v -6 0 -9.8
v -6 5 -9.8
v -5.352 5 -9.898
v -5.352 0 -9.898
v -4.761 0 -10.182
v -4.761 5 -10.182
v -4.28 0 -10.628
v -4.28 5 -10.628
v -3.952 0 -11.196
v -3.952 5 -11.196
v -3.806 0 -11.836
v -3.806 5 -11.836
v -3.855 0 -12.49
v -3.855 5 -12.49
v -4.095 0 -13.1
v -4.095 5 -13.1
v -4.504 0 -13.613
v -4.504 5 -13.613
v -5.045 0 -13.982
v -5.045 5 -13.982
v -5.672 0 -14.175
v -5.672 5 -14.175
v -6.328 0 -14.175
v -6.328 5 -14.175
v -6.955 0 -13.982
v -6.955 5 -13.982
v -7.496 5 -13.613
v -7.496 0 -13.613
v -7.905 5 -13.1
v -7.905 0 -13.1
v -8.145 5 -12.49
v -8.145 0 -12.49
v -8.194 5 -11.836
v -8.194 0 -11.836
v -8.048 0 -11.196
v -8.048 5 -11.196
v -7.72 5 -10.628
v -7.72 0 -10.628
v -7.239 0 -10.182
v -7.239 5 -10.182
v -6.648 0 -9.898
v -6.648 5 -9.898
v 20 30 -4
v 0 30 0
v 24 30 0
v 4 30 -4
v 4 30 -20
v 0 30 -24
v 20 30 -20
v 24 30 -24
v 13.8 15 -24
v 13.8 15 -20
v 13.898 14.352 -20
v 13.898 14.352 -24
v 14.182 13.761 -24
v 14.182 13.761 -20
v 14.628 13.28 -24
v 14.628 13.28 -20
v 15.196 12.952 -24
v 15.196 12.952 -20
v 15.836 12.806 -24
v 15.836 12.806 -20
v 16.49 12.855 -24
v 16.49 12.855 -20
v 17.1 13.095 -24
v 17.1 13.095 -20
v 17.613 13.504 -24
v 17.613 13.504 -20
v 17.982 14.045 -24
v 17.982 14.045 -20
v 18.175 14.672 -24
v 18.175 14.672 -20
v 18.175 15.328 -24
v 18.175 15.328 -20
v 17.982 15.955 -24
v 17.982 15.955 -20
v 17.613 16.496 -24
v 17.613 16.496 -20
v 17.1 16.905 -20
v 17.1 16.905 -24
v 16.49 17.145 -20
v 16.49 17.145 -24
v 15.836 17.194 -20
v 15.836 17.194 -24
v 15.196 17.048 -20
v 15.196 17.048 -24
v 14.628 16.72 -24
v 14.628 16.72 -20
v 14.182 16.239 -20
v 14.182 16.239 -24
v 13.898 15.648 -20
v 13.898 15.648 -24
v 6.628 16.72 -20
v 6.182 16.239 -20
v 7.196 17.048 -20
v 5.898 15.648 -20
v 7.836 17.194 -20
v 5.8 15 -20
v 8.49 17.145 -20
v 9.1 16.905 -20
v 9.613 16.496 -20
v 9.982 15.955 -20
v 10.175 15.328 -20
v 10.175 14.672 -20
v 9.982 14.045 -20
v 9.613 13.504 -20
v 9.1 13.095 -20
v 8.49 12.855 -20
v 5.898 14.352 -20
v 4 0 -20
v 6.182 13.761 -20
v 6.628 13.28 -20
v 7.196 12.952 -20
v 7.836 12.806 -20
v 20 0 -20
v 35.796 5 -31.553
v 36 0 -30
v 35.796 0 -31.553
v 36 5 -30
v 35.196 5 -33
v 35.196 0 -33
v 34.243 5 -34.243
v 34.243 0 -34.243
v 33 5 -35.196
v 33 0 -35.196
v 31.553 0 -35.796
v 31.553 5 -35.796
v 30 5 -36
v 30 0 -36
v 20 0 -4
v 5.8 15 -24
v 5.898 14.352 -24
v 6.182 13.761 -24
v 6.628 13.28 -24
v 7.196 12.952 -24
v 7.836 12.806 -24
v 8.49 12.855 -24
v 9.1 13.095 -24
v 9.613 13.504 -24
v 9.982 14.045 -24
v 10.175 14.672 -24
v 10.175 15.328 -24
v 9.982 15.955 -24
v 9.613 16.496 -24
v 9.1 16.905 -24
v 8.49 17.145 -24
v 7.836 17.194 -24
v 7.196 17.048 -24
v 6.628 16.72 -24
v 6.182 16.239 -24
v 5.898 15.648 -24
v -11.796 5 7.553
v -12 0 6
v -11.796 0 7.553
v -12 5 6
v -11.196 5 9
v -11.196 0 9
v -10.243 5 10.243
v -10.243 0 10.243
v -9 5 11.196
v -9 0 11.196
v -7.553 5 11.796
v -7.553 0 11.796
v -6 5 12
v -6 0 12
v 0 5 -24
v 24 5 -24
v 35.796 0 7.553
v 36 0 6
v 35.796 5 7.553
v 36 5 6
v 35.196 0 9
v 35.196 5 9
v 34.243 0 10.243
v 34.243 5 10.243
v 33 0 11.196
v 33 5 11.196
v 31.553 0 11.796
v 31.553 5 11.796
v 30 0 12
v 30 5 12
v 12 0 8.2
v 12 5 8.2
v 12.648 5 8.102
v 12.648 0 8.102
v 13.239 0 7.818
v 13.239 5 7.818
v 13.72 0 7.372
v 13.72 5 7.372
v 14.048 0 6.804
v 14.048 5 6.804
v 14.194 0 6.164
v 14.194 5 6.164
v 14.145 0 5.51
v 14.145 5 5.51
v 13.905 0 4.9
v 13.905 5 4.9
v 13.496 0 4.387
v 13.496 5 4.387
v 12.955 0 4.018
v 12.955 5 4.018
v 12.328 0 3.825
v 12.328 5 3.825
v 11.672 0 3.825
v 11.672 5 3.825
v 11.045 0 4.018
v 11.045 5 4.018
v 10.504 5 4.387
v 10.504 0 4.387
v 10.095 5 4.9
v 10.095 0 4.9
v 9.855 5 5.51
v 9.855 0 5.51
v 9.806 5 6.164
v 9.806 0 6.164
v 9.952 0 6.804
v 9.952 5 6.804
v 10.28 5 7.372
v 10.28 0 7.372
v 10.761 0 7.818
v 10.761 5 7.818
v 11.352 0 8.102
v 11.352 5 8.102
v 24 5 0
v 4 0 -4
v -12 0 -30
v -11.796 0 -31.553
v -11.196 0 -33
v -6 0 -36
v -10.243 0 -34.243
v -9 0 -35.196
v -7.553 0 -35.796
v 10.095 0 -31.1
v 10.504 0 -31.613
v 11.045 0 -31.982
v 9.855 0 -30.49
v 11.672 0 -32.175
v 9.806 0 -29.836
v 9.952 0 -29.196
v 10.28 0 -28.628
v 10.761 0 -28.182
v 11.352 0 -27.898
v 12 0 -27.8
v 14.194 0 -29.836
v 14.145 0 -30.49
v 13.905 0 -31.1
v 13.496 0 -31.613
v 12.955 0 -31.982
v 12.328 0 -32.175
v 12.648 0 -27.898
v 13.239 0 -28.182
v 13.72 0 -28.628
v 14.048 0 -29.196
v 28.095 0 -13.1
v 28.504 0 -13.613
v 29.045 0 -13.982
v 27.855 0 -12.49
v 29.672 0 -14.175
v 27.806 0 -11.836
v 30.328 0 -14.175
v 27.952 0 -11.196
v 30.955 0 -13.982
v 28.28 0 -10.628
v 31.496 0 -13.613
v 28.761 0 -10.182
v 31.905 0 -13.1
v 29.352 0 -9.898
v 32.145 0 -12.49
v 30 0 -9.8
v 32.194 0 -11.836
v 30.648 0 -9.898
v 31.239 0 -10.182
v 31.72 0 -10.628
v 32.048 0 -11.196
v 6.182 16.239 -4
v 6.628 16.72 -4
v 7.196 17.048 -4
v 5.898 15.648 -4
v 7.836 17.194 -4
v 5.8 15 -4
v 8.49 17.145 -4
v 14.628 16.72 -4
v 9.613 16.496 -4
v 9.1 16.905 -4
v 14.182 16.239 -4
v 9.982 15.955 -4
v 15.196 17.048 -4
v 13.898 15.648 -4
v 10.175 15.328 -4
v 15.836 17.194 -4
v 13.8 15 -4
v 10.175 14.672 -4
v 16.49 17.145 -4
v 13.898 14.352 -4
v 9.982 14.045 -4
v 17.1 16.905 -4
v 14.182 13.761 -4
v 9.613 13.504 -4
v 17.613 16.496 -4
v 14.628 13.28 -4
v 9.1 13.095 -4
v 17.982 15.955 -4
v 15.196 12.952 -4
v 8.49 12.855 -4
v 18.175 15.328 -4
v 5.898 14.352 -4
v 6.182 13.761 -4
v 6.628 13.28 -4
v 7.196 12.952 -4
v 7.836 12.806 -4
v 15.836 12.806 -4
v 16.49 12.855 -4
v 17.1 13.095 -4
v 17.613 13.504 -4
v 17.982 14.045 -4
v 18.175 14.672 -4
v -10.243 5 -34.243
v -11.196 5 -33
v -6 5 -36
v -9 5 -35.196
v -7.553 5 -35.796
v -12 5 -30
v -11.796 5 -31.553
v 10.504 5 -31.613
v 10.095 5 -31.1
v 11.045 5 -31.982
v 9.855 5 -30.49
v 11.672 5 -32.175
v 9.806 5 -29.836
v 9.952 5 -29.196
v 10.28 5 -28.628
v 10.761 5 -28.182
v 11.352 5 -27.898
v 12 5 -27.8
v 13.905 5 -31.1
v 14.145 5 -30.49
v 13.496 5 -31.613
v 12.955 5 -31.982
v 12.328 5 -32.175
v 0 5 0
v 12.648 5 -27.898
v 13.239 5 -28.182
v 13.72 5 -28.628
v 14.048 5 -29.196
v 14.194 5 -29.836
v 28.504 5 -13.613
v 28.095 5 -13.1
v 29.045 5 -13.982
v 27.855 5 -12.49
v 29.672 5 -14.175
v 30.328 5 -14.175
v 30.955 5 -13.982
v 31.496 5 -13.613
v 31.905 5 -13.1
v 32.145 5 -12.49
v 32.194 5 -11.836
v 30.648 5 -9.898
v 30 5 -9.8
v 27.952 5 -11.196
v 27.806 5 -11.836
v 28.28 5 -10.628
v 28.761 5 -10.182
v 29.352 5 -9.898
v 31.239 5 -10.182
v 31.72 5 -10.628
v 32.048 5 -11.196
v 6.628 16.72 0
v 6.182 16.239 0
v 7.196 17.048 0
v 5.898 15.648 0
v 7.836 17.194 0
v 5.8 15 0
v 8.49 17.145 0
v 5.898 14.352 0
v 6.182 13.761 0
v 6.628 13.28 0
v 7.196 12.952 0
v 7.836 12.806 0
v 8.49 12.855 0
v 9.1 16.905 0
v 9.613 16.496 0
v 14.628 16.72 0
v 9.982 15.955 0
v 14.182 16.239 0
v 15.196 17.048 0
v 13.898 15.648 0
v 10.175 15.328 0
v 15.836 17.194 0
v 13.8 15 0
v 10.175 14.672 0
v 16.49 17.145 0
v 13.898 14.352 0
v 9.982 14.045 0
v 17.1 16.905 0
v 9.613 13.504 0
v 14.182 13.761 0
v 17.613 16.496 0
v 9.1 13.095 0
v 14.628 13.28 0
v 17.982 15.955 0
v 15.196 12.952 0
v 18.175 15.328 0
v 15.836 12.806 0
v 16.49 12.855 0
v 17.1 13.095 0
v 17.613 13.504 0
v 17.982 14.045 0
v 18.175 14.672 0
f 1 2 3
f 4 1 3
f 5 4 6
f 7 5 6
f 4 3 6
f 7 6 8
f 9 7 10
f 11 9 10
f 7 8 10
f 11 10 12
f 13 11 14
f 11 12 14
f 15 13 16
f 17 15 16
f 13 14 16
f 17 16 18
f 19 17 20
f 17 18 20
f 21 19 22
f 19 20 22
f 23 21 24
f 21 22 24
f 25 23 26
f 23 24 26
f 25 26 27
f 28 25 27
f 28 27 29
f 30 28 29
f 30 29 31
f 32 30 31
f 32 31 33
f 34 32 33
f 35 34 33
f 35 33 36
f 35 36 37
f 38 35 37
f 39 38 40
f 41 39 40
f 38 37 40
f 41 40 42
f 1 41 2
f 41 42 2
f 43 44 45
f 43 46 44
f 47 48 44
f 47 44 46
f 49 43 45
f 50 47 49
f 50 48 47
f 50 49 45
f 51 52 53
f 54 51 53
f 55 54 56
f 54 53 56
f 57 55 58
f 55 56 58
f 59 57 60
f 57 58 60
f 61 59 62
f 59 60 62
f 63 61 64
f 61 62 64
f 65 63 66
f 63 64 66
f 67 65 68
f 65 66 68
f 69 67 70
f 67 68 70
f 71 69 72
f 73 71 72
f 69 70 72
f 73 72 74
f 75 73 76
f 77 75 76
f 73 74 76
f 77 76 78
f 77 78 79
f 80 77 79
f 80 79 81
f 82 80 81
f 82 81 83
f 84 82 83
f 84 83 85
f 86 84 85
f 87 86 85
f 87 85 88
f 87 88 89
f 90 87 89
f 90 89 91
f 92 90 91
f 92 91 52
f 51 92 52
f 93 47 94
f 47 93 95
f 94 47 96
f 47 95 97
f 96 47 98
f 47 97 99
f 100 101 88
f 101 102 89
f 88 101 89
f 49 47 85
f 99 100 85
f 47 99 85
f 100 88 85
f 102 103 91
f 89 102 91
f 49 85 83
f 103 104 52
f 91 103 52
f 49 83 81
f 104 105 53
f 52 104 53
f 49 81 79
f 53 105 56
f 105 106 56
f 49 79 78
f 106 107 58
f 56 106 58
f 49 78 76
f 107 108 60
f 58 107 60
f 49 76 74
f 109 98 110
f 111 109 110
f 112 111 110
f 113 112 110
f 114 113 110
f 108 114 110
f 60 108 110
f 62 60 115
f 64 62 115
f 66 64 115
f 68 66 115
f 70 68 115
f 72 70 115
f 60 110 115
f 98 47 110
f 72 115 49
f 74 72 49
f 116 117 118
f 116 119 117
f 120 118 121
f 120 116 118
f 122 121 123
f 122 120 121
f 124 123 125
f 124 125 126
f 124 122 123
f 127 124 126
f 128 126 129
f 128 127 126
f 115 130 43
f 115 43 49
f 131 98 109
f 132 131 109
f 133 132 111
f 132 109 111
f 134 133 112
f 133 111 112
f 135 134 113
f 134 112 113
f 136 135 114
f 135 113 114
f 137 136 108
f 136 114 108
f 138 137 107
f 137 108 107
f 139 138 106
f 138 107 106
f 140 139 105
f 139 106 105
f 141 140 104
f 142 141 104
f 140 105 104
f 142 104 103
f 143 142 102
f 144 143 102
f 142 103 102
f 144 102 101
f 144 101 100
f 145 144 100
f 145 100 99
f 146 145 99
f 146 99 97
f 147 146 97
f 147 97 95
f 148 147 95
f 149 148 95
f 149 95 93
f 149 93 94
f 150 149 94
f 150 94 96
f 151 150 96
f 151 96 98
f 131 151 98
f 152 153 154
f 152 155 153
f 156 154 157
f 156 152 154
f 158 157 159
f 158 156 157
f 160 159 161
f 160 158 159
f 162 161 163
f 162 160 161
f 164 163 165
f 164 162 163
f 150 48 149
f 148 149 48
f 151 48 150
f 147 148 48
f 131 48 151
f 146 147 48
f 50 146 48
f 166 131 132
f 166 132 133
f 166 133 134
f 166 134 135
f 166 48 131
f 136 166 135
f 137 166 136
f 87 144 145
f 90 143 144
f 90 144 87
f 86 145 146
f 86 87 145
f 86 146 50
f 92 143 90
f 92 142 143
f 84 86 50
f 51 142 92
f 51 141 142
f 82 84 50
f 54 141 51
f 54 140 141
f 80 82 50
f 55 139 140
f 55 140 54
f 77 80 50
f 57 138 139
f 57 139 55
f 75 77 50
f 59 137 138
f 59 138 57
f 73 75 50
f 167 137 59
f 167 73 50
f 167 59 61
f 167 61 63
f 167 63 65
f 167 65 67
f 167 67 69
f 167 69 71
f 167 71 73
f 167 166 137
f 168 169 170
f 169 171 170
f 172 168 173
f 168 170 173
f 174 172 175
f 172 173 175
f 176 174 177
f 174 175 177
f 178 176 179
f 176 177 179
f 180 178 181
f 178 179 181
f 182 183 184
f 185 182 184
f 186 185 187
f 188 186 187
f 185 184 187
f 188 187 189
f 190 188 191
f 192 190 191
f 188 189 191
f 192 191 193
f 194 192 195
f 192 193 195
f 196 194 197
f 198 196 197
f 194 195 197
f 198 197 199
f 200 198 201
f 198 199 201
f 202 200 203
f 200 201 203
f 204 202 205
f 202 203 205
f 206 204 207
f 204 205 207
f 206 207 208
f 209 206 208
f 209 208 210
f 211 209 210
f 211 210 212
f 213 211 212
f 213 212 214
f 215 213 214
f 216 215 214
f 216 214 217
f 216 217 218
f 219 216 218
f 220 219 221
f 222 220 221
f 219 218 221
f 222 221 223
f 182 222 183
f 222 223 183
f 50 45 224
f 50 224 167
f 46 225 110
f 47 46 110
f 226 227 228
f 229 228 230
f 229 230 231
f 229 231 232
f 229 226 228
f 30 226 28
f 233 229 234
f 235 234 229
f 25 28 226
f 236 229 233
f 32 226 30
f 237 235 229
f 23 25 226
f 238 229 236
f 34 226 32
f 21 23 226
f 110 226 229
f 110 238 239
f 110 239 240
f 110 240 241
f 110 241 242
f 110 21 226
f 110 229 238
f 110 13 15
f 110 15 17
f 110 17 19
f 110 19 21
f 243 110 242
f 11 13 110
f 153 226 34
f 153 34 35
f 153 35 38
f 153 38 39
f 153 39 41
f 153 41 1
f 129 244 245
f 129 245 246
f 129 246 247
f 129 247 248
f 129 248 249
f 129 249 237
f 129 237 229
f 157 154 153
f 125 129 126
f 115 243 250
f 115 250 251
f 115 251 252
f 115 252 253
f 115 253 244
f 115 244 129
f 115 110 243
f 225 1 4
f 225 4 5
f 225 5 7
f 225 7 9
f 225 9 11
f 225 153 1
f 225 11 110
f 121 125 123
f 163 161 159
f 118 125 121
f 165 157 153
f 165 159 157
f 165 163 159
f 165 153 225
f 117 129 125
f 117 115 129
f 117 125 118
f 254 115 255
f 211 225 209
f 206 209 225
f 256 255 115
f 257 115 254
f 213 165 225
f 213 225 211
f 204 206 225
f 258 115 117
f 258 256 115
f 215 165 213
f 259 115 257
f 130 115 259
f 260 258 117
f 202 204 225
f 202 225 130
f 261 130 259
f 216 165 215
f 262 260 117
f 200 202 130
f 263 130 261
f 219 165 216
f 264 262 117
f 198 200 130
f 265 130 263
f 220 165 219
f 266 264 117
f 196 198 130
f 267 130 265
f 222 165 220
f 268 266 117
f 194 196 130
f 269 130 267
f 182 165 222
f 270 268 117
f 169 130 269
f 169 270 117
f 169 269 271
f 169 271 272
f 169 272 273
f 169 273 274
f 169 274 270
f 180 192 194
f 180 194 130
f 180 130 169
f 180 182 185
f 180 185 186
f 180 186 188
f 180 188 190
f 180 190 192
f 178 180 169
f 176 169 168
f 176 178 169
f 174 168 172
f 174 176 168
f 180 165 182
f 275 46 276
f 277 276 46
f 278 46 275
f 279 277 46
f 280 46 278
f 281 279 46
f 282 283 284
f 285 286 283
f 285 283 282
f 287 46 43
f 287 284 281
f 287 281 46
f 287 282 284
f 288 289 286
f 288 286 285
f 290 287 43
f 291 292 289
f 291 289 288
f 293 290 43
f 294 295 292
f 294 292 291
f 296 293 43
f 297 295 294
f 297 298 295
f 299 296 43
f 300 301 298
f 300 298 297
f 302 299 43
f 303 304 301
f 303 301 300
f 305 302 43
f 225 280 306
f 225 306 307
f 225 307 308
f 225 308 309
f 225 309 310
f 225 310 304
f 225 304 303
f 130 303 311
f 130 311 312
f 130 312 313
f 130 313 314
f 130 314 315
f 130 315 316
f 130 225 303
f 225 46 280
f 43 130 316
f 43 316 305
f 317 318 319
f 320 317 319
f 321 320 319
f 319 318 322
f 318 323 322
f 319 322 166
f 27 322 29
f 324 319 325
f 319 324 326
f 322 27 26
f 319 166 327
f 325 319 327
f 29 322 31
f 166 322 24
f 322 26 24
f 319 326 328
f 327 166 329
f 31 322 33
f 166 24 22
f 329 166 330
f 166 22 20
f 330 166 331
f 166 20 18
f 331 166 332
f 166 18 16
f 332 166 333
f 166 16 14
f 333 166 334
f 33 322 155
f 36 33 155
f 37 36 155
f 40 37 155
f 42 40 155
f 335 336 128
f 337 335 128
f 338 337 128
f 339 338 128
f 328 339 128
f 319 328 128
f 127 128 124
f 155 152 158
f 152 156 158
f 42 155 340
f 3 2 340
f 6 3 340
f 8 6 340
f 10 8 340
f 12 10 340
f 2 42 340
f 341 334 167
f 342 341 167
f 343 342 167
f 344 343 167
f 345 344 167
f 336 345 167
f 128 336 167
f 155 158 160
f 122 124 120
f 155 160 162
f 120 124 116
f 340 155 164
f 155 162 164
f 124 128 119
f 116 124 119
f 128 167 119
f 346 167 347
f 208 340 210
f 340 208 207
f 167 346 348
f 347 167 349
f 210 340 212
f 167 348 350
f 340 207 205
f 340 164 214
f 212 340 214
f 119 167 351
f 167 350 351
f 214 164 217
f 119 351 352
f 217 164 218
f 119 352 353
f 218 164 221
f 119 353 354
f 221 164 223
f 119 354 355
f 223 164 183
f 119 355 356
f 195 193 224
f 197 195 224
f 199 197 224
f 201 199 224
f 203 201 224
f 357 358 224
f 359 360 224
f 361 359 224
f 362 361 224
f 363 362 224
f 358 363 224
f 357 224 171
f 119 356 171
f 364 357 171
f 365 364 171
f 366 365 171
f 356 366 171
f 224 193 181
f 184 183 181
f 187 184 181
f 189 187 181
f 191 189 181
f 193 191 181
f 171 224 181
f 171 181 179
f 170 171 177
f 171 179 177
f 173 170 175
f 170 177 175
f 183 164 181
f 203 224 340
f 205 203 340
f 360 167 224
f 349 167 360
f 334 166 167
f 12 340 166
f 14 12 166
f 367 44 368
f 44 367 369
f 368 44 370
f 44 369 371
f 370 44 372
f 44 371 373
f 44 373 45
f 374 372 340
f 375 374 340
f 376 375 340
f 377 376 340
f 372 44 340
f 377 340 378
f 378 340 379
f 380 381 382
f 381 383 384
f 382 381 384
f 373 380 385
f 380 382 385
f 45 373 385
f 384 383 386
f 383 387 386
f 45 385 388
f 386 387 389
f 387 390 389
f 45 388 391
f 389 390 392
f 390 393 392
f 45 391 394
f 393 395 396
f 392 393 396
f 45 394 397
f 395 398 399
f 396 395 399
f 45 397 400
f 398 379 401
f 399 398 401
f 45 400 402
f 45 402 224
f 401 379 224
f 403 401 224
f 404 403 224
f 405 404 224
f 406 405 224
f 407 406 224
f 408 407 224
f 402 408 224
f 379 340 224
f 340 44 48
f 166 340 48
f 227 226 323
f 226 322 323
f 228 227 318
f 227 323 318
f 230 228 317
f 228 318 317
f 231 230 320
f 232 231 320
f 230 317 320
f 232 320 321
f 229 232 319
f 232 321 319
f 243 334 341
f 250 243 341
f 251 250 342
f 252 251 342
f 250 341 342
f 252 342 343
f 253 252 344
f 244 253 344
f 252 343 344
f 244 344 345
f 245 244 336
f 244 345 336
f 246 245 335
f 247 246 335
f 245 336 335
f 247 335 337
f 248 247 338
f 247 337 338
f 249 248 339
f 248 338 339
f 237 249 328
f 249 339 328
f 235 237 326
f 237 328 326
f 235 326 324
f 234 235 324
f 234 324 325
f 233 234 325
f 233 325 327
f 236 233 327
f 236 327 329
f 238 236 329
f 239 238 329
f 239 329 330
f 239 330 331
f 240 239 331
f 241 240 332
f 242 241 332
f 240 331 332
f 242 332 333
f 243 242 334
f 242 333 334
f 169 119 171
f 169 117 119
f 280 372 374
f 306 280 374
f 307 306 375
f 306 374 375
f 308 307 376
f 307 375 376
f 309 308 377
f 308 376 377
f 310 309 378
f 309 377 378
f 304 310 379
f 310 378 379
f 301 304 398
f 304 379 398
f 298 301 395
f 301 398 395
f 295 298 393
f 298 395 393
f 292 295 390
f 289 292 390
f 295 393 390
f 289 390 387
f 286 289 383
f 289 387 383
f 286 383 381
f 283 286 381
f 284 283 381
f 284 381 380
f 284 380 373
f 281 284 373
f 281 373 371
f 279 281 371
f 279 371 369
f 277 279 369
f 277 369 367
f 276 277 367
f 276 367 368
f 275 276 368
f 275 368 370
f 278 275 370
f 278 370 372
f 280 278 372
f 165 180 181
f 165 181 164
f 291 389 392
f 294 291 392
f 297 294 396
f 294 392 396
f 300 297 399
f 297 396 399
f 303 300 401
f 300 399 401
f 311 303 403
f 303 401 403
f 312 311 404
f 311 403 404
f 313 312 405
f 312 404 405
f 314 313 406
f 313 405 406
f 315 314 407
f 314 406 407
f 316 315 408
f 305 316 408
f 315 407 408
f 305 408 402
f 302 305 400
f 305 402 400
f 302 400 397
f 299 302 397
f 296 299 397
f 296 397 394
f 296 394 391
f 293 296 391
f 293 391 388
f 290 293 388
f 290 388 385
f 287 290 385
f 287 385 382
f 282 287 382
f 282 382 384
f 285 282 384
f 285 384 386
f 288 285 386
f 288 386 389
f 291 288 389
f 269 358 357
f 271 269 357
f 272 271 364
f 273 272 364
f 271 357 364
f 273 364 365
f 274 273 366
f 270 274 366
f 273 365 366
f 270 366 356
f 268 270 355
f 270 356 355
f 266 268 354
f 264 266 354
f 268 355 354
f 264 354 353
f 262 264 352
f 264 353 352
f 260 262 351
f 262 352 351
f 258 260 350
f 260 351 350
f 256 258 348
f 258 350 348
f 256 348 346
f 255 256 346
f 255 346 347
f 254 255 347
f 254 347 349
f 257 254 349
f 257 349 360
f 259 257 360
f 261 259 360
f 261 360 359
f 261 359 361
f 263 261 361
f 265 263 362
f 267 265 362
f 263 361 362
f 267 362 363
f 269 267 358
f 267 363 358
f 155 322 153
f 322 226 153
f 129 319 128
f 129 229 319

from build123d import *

# Parameters (mm, degrees)
SKETCH_1_W          = 24
SKETCH_1_H          = 24
SKETCH_1_W_2        = 16
SKETCH_1_H_2        = 16
EXTRUDE_1_DEPTH     = 30
SKETCH_2_R          = 2.2
CUT_EXTRUDE_1_DEPTH = 31
SKETCH_3_W          = 6
SKETCH_3_H          = 6
SKETCH_3_W_2        = 24
SKETCH_3_H_2        = 24
EXTRUDE_3_DEPTH     = 5
FILLET_1_R          = 6
SKETCH_4_R          = 2.2
CUT_EXTRUDE_2_DEPTH = 5


with BuildPart() as part:
    # 草图1 → 凸台-拉伸1 (new body)
    with BuildSketch(Plane(origin=(0, 0, 0), x_dir=(1, 0, 0), z_dir=(0, 1, 0))):
        with Locations((12, 12)):
            Rectangle(SKETCH_1_W, SKETCH_1_H)
        with Locations((12, 12)):
            Rectangle(SKETCH_1_W_2, SKETCH_1_H_2, mode=Mode.SUBTRACT)
    extrude(amount=EXTRUDE_1_DEPTH)

    # 草图2 → 切除-拉伸1 (cut)
    with BuildSketch(Plane.XY):
        with Locations(Location((8, 15, 0), (0, 0, 180))):
            Circle(SKETCH_2_R)
        with Locations(Location((16, 15, 0), (0, 0, 180))):
            Circle(SKETCH_2_R)
    extrude(amount=-CUT_EXTRUDE_1_DEPTH, mode=Mode.SUBTRACT)

    # 草图3 → 凸台-拉伸3 (add)
    # profile 1 of 5: a face of its own
    with BuildSketch(Plane.XZ):
        with Locations((-9, -33)):
            Rectangle(SKETCH_3_W, SKETCH_3_H)
    # profile 2 of 5: a face of its own
    with BuildSketch(Plane.XZ):
        Polygon((-12, -30), (-6, -30), (-6, 6), (0, 6), (30, 6), (30, 12), (-12, 12), align=None)
    # profile 3 of 5: a face of its own
    with BuildSketch(Plane.XZ):
        Polygon((30, -30), (30, 6), (0, 6), (-6, 6), (-6, -30), align=None)
        with Locations((12, -12)):
            Rectangle(SKETCH_3_W_2, SKETCH_3_H_2, mode=Mode.SUBTRACT)
    # profile 4 of 5: a face of its own
    with BuildSketch(Plane.XZ):
        Polygon((30, -30), (-6, -30), (-6, -36), (36, -36), (36, 6), (30, 6), align=None)
    # profile 5 of 5: a face of its own
    with BuildSketch(Plane.XZ):
        with Locations((33, 9)):
            Rectangle(SKETCH_3_W, SKETCH_3_H)
    extrude(amount=-EXTRUDE_3_DEPTH)

    # 圆角1
    fillet_1_edges = [part.edges().sort_by_distance(p)[0] for p in [
        (36, 2.5, 12),
        (36, 2.5, -36),
        (-12, 2.5, -36),
        (-12, 2.5, 12),
    ]]
    fillet(fillet_1_edges, radius=FILLET_1_R)

    # 草图4 → 切除-拉伸2 (cut)
    with BuildSketch(Plane(origin=(0, 5, 0), x_dir=(1, 0, 0), z_dir=(0, 1, 0))):
        with Locations(Location((12, -6, 0), (0, 0, 270))):
            Circle(SKETCH_4_R)
        with Locations(Location((-6, 12, 0), (0, 0, 270))):
            Circle(SKETCH_4_R)
        with Locations(Location((12, 30, 0), (0, 0, 270))):
            Circle(SKETCH_4_R)
        with Locations(Location((30, 12, 0), (0, 0, 270))):
            Circle(SKETCH_4_R)
    extrude(amount=-CUT_EXTRUDE_2_DEPTH, mode=Mode.SUBTRACT)


solid = part.part
